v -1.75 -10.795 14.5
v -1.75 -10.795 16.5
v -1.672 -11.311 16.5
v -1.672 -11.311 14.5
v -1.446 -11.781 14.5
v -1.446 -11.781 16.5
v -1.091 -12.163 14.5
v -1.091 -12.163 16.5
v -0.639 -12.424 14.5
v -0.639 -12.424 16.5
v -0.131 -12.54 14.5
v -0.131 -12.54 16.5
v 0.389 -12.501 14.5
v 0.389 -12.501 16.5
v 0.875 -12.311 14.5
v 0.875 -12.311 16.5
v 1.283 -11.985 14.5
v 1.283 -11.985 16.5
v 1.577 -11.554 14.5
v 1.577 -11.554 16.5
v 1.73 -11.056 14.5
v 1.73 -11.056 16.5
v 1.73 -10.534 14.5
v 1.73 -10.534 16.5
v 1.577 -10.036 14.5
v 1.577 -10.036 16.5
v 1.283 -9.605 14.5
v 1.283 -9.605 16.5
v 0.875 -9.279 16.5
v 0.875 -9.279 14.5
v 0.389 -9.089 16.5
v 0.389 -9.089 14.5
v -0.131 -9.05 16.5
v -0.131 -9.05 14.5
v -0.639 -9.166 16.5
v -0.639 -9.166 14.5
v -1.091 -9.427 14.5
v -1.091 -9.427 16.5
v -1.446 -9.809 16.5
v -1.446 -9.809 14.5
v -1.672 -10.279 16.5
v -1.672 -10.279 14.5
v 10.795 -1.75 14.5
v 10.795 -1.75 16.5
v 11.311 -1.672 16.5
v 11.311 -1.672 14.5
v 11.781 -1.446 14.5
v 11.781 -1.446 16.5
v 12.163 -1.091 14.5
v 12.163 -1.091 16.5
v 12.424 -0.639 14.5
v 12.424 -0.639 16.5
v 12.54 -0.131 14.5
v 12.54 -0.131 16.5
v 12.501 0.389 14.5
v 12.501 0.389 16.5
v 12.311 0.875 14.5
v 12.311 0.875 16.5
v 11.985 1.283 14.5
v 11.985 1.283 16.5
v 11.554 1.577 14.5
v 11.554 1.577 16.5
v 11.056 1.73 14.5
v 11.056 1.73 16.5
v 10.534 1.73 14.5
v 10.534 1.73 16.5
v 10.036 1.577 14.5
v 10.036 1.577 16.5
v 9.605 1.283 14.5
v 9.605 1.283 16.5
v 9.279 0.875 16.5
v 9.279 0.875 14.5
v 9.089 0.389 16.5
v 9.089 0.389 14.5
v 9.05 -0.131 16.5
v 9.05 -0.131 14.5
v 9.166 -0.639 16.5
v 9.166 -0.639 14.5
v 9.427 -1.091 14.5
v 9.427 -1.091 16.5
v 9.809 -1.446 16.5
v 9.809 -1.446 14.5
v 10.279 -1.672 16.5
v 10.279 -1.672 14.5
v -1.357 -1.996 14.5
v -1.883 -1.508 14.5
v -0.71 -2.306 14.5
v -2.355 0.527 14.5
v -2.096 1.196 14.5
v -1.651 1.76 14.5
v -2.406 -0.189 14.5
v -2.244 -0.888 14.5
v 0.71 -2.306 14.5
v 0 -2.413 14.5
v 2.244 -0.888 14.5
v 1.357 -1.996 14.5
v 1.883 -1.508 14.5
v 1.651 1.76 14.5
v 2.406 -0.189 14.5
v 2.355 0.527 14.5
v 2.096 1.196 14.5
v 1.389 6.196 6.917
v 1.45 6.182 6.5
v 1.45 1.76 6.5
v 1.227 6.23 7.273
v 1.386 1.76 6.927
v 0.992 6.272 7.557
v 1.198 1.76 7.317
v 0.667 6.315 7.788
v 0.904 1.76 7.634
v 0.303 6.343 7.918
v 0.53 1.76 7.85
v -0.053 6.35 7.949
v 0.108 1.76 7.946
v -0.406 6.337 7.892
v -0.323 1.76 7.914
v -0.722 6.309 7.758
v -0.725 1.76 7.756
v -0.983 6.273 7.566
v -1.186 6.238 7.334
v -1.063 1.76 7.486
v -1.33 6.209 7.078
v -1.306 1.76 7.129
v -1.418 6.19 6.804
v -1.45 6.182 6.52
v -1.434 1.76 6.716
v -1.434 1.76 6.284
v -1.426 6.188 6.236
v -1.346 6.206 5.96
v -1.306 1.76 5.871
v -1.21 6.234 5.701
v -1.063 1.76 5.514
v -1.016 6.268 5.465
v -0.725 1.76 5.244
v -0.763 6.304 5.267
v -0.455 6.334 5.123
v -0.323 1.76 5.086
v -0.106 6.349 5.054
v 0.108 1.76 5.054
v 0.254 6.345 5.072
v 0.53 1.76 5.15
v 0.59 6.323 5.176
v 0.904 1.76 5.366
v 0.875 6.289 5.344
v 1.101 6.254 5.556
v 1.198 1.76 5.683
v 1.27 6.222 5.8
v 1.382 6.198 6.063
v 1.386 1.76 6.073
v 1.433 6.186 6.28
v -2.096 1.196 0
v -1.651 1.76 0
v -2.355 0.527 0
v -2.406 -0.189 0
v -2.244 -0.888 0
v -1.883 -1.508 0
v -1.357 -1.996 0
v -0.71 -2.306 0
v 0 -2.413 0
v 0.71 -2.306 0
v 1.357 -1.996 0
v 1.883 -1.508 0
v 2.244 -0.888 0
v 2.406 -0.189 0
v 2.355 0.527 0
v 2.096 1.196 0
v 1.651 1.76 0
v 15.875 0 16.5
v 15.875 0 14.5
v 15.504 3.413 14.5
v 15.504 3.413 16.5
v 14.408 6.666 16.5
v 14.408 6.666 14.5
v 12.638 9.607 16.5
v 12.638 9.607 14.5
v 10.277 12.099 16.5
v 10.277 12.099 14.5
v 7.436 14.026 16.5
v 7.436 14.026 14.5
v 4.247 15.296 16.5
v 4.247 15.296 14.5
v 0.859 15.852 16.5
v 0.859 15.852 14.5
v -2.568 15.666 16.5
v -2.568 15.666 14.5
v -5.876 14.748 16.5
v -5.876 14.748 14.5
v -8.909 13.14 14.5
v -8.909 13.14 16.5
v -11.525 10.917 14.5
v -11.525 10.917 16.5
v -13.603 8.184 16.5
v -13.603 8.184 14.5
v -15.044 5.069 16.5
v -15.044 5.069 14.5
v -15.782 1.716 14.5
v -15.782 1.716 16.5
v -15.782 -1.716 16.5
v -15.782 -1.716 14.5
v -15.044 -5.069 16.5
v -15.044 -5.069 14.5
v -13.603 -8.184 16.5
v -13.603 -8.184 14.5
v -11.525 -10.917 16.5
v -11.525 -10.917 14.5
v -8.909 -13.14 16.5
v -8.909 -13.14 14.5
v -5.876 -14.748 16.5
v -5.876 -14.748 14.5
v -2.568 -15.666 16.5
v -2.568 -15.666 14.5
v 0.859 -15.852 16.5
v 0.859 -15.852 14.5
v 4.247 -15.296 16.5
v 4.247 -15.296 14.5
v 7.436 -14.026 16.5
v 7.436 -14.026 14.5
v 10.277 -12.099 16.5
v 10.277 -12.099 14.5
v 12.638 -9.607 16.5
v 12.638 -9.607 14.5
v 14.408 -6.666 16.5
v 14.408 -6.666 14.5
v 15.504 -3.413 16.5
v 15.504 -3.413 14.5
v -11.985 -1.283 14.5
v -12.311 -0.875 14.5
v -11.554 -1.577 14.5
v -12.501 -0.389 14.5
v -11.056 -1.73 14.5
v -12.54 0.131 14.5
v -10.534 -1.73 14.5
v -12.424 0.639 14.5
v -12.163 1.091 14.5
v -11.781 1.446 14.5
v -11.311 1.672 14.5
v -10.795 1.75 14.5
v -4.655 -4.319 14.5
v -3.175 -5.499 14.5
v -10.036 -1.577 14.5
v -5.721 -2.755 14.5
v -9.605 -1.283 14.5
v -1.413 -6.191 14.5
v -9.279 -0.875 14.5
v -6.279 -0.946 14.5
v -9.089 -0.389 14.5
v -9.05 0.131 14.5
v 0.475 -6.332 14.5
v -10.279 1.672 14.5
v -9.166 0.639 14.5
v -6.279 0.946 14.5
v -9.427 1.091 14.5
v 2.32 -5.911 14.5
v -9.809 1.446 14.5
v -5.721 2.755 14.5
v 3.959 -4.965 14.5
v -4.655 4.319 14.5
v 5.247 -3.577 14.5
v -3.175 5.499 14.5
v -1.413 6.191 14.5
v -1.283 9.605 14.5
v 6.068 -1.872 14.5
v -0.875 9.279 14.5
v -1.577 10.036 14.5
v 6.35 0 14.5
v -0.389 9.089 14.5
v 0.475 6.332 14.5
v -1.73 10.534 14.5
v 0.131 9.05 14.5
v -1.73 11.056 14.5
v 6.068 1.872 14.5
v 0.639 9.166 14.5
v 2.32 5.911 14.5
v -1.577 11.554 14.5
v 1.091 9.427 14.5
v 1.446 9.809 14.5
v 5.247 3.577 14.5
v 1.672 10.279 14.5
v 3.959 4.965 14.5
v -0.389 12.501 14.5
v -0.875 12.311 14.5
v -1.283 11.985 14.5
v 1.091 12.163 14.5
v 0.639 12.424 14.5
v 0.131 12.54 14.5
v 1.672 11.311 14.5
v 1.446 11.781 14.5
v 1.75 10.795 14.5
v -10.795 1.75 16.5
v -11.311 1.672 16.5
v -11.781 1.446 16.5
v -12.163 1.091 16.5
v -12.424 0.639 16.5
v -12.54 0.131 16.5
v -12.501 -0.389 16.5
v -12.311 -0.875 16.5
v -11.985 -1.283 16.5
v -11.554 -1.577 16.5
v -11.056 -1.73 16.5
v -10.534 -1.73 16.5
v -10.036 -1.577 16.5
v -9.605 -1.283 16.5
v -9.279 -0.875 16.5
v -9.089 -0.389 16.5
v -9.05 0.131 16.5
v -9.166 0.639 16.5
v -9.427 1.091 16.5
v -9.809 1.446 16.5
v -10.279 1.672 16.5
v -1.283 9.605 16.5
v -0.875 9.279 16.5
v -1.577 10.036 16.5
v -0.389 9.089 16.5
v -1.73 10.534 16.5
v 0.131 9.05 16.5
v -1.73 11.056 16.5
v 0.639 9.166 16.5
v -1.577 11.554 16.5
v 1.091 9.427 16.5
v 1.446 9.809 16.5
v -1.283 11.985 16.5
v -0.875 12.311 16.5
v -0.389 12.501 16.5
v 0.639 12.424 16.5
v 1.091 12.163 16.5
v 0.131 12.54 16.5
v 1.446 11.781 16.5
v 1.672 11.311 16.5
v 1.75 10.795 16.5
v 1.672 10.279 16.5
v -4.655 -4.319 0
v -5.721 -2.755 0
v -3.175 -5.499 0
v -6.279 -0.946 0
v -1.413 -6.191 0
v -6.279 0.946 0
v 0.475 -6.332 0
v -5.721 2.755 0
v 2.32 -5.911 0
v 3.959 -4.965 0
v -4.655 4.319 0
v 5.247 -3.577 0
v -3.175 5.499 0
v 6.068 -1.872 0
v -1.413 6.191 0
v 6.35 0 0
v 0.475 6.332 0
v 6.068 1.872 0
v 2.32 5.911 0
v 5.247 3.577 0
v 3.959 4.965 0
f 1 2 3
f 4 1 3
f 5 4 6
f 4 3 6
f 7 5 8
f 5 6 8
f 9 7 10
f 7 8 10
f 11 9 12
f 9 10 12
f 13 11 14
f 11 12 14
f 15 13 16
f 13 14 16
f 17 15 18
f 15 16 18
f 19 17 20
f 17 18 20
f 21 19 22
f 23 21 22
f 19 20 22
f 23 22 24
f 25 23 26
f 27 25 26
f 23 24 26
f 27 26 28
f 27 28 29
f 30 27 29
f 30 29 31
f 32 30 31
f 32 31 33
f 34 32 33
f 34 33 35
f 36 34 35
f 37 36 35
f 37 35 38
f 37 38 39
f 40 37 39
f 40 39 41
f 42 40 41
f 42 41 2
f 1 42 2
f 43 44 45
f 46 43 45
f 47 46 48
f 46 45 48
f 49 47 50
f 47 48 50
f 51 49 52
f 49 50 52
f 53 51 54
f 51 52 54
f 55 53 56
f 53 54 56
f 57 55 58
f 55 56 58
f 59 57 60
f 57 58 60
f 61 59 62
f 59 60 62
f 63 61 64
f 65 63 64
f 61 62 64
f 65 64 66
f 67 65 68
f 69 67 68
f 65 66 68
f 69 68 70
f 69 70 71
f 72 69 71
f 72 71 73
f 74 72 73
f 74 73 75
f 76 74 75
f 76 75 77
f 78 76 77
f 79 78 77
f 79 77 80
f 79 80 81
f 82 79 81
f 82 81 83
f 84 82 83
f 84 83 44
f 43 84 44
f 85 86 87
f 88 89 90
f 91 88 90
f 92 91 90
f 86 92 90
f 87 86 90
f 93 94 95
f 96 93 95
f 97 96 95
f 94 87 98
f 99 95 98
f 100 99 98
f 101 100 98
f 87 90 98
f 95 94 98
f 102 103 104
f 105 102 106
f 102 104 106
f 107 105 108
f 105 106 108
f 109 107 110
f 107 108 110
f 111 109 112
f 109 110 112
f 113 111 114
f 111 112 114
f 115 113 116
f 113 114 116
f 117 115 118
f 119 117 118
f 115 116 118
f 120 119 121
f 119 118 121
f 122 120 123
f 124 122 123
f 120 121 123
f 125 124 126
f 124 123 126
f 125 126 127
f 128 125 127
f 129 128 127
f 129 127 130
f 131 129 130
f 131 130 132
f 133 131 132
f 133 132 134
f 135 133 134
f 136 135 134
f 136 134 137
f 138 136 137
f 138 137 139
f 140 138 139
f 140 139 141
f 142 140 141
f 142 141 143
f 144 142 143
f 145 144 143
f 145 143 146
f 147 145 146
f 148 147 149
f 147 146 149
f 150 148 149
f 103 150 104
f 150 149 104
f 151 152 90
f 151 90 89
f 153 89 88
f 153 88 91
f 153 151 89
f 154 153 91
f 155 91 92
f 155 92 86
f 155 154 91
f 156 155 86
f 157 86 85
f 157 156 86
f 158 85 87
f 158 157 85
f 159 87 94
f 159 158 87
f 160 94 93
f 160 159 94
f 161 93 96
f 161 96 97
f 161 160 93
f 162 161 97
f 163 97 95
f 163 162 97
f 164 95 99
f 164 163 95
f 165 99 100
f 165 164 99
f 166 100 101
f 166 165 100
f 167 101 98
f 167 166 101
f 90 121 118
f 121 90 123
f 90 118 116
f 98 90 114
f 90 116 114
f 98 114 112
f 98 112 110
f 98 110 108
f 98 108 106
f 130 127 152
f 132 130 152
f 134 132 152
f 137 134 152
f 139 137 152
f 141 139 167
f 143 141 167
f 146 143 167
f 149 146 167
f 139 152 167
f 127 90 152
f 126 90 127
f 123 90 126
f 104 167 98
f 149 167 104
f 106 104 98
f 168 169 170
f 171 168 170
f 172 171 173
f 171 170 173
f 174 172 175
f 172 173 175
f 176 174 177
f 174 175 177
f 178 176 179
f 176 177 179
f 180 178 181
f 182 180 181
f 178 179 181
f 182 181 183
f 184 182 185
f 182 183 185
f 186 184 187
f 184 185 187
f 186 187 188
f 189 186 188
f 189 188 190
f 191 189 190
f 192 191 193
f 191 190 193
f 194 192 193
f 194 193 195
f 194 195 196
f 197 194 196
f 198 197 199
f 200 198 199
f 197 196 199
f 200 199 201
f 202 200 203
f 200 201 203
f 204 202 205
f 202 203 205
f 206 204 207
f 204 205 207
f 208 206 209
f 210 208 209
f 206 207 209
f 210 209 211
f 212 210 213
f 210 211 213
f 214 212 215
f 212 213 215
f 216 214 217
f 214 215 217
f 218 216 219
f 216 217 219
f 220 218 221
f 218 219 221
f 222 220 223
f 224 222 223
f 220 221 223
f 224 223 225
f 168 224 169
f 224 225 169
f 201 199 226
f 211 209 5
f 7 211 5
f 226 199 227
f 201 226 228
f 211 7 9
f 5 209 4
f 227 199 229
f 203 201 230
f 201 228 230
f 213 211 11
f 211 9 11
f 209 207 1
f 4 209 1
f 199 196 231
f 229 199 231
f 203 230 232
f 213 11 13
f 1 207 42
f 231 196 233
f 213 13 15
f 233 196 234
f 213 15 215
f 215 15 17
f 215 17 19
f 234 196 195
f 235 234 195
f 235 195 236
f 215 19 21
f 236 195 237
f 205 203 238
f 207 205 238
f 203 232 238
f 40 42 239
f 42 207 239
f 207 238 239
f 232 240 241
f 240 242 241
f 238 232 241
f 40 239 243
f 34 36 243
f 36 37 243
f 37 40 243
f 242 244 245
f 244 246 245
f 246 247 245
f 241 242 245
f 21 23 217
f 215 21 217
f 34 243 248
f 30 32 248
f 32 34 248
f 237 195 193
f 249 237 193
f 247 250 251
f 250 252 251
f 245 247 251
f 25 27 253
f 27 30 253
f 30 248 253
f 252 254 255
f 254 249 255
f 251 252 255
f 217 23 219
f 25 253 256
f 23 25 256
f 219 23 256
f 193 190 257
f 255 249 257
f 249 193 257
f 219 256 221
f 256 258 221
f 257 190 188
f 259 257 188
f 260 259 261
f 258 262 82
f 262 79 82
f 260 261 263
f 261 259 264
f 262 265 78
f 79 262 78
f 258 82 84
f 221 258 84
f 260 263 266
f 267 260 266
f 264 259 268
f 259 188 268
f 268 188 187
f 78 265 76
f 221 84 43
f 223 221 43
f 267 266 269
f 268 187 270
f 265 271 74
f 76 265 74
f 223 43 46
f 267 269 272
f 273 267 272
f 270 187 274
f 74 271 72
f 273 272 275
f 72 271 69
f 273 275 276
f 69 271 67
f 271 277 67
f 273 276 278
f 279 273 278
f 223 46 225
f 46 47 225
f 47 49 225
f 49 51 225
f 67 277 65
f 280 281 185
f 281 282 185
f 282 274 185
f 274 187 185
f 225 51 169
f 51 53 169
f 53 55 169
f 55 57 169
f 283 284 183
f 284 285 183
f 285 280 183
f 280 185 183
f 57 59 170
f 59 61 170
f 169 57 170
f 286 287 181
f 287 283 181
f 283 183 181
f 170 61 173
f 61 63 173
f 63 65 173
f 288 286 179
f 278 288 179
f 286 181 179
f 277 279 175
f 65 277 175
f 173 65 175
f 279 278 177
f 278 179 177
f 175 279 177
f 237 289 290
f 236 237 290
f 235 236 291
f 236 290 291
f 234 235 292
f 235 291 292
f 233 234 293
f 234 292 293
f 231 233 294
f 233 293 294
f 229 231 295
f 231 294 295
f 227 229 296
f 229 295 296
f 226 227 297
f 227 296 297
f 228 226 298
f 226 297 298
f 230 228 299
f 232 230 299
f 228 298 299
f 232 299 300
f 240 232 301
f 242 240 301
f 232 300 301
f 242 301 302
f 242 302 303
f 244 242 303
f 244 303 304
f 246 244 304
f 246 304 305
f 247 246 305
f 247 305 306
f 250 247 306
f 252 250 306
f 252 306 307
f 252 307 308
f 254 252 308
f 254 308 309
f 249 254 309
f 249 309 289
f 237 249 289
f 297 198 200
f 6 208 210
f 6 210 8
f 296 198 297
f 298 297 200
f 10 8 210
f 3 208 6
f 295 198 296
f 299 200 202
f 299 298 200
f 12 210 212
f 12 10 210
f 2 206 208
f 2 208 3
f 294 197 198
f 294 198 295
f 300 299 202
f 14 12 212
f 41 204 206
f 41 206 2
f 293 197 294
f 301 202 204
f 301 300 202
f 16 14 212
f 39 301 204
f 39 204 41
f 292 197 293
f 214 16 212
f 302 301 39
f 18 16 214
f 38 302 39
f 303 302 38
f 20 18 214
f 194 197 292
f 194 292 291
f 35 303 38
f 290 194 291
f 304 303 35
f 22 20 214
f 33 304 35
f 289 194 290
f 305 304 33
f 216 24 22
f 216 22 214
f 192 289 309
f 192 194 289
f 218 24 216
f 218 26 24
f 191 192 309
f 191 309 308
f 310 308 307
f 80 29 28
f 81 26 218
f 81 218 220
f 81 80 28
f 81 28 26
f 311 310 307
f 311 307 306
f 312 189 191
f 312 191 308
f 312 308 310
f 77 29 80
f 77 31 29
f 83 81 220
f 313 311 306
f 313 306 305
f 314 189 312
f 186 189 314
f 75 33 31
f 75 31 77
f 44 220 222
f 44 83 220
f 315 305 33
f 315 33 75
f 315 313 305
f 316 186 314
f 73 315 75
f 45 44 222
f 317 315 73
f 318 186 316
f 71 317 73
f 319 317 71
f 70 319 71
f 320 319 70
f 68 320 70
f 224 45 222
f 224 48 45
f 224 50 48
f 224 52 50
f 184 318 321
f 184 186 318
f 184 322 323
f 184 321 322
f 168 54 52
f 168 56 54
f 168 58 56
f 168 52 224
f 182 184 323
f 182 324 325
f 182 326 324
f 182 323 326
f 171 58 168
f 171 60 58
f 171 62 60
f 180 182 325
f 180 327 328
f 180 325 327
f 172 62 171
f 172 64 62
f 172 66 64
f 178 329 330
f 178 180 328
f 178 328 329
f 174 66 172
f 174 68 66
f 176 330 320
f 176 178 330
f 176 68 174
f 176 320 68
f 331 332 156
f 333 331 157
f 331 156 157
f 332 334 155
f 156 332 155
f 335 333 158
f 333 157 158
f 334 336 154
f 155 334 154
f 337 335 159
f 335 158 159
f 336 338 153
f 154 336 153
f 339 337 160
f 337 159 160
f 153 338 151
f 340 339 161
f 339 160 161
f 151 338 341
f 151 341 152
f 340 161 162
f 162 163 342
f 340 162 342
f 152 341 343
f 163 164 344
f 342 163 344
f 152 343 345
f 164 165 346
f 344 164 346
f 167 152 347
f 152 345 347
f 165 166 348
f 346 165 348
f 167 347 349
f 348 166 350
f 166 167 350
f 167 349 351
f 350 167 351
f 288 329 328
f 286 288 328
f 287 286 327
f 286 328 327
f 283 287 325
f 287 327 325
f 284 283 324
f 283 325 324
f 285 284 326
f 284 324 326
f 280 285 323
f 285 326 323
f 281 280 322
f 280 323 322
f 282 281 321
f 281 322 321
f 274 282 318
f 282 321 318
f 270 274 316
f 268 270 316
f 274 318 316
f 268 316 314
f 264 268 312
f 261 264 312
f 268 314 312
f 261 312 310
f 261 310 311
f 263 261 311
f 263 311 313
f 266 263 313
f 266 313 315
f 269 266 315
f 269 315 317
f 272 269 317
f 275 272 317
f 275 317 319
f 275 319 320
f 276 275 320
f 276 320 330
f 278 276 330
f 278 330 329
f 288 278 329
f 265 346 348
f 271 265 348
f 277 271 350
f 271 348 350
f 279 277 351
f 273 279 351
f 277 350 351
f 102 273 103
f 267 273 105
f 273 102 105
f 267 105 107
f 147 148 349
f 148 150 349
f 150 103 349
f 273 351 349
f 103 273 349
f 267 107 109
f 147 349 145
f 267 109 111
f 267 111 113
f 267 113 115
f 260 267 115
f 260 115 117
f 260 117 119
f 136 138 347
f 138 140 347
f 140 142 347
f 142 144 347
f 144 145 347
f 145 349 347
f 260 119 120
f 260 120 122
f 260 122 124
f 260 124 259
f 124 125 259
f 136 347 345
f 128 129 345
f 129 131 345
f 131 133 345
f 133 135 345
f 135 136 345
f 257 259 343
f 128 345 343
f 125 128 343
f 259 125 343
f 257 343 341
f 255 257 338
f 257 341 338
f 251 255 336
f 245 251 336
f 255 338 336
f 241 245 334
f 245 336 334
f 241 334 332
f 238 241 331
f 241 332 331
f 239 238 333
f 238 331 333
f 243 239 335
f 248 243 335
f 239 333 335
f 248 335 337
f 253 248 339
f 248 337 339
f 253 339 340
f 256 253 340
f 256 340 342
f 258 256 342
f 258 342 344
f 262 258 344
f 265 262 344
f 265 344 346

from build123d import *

# Parameters (mm, degrees)
SKETCH_R           = 6.35
PAD_DEPTH          = 14.5
SKETCH001_R        = 1.45
POCKET_DEPTH       = 4.590236
SKETCH002_R        = 15.875
PAD001_DEPTH       = 2
SKETCH003_R        = 1.75
POCKET001_DEPTH    = 5
POLARPATTERN_COUNT = 4


with BuildPart() as part:
    # Sketch → Pad (new body)
    with BuildSketch(Plane.XY):
        Circle(SKETCH_R)
        with BuildLine():
            ThreePointArc((-1.651, 1.759764), (0, -2.413), (1.651, 1.759764))
            Line((-1.651, 1.759764), (1.651, 1.759764))
        make_face(mode=Mode.SUBTRACT)
    extrude(amount=PAD_DEPTH)

    # Sketch001 (on DatumPlane) → Pocket (cut)
    with BuildSketch(Plane.XZ.offset(-1.759764)):
        with Locations((0, 6.5)):
            Circle(SKETCH001_R)
    extrude(amount=-POCKET_DEPTH, mode=Mode.SUBTRACT)

    # Sketch002 (on Face3 of Pocket) → Pad001 (join)
    with BuildSketch(Plane.XY.offset(14.5)):
        Circle(SKETCH002_R)
    extrude(amount=PAD001_DEPTH)

    # Sketch003 (on Face3 of Pad001) → Pocket001 (cut)
    with BuildSketch(Plane.XY.offset(16.5)):
        with Locations((0, 10.795)):
            Circle(SKETCH003_R)
    pocket001 = extrude(amount=-POCKET001_DEPTH, mode=Mode.SUBTRACT)

    # PolarPattern: Pocket001 ×4 about axis
    polarpattern_axis = Axis((0, 0, 16.5), (0, 0, 1))
    for i in range(1, POLARPATTERN_COUNT):
        add(pocket001.rotate(polarpattern_axis, i * 360 / POLARPATTERN_COUNT), mode=Mode.SUBTRACT)


solid = part.part
